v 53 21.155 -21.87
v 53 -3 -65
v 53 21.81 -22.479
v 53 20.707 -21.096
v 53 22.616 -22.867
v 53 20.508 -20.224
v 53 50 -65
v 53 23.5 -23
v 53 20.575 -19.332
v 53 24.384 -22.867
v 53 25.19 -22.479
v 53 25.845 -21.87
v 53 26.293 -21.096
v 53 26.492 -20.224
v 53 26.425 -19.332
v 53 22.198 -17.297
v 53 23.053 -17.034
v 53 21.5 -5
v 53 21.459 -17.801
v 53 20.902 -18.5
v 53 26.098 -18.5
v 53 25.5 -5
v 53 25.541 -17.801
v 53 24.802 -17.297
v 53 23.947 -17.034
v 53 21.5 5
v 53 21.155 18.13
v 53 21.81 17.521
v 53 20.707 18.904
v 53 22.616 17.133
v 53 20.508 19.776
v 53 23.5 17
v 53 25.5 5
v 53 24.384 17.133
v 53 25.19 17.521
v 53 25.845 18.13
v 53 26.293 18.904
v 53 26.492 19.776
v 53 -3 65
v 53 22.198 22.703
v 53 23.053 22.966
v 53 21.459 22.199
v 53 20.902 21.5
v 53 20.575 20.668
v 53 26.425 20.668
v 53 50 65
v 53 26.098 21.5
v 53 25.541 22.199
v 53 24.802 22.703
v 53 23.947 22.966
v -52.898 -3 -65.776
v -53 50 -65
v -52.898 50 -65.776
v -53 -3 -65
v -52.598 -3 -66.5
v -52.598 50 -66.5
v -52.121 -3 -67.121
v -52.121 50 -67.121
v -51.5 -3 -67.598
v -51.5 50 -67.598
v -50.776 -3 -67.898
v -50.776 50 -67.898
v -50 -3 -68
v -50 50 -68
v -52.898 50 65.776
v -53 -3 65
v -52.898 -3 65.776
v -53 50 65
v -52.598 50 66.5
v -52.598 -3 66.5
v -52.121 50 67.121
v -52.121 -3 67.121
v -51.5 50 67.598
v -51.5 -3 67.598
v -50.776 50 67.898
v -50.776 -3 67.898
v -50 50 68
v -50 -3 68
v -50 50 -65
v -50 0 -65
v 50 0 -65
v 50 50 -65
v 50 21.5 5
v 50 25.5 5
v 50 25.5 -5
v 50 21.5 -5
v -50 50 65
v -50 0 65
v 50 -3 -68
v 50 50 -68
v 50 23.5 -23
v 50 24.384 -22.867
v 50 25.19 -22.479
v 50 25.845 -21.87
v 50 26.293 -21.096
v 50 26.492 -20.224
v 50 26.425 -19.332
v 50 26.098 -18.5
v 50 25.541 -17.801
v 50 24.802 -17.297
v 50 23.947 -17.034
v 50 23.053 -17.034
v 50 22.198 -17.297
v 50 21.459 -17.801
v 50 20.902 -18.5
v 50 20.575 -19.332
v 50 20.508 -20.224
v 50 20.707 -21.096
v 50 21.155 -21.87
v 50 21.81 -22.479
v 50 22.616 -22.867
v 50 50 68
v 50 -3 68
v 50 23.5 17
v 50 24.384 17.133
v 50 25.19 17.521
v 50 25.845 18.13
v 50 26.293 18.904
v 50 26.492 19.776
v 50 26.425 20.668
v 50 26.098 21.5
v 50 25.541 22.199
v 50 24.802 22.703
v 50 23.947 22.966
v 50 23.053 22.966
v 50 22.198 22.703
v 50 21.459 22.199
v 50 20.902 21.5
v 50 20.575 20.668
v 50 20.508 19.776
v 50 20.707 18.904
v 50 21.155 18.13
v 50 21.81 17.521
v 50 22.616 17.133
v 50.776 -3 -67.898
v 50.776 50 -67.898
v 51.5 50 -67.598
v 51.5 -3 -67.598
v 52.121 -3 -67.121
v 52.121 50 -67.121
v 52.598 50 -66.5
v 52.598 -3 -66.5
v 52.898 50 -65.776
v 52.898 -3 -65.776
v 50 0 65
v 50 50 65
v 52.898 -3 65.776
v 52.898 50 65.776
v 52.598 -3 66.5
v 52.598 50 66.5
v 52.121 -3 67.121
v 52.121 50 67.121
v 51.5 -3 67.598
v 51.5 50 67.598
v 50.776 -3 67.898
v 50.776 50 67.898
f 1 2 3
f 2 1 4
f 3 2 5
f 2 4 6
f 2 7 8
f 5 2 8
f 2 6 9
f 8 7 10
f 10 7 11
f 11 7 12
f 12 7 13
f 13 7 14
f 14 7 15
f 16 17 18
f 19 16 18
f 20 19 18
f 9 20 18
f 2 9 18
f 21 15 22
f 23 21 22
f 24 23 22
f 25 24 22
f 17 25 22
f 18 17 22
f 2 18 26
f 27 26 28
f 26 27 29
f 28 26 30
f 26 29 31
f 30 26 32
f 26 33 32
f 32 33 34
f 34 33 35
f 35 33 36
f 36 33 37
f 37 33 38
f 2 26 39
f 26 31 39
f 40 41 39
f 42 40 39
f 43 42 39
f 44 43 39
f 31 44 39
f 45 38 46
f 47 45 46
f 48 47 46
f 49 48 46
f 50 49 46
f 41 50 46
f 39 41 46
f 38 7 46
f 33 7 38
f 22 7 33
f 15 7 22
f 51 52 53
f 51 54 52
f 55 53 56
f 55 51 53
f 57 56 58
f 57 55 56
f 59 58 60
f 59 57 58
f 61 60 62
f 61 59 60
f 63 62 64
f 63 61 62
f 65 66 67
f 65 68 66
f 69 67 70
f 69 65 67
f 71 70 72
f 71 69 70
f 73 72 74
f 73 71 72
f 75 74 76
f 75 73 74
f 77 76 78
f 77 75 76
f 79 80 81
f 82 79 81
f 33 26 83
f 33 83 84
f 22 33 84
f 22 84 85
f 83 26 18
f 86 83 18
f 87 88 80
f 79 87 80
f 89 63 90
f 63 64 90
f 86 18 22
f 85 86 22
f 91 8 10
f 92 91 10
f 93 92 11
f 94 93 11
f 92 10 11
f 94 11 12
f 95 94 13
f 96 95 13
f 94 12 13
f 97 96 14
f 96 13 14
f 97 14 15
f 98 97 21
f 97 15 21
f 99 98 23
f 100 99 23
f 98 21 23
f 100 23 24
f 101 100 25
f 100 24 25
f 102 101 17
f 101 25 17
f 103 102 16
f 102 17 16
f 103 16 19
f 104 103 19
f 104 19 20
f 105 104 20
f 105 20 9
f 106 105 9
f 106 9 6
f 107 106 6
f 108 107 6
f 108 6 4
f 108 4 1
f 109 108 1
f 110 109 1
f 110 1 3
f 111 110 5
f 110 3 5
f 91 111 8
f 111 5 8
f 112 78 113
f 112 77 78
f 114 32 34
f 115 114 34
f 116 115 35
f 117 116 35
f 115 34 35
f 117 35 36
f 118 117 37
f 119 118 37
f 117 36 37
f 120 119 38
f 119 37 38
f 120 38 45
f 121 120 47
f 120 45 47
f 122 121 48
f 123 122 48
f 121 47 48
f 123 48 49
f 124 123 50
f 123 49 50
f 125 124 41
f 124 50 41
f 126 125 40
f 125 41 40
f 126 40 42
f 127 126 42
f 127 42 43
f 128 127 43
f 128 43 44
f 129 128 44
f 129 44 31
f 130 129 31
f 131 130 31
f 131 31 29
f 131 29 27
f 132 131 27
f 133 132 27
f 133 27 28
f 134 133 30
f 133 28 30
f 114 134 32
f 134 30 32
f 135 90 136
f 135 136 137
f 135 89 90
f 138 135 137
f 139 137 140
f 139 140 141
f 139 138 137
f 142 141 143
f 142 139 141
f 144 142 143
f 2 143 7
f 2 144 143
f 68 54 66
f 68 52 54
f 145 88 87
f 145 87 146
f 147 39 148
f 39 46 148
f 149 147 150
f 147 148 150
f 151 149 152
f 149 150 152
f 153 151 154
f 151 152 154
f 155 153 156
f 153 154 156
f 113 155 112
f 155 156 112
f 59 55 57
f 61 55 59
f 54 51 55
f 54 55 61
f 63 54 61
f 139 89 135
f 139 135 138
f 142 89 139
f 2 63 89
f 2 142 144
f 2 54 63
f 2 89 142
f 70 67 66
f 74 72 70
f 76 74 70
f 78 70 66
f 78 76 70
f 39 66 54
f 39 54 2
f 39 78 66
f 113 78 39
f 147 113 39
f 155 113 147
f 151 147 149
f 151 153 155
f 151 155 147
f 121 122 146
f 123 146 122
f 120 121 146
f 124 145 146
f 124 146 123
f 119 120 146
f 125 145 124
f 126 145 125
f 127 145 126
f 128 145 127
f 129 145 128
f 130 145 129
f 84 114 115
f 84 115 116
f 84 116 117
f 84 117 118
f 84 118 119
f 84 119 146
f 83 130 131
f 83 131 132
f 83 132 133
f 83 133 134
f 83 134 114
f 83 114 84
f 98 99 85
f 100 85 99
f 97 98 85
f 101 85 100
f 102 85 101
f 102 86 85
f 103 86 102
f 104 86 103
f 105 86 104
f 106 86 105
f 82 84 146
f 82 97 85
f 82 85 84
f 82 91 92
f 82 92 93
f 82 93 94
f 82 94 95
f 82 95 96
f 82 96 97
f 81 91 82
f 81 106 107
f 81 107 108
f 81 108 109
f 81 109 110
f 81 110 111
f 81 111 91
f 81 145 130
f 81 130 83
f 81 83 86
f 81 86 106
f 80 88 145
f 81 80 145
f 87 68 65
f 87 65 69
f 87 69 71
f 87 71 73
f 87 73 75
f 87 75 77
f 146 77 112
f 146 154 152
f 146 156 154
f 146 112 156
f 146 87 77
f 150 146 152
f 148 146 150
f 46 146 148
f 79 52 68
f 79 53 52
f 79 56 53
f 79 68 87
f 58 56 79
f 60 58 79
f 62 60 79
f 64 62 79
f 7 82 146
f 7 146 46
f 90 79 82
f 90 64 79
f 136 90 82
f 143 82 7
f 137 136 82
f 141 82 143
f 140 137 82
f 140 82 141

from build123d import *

# Parameters (mm, degrees)
ESQUISSE1_W             = 106
ESQUISSE1_H             = 136
ESQUISSE1_W_2           = 100
ESQUISSE1_H_2           = 130
BOSS_EXTRU_1_DEPTH      = 50
ESQUISSE2_W             = 106
ESQUISSE2_H             = 136
BOSS_EXTRU_2_DEPTH      = 3
CONG_1_R                = 3
ESQUISSE3_R             = 3
ESQUISSE3_W             = 10
ESQUISSE3_H             = 4
ENL_V_MAT_EXTRU_1_DEPTH = 3


with BuildPart() as part:
    # Esquisse1 → Boss.-Extru.1 (new body)
    with BuildSketch(Plane(origin=(0, 0, 0), x_dir=(1, 0, 0), z_dir=(0, 1, 0))):
        Rectangle(ESQUISSE1_W, ESQUISSE1_H)
        Rectangle(ESQUISSE1_W_2, ESQUISSE1_H_2, mode=Mode.SUBTRACT)
    extrude(amount=BOSS_EXTRU_1_DEPTH)

    # Esquisse2 → Boss.-Extru.2 (add)
    with BuildSketch(Plane.XZ):
        Rectangle(ESQUISSE2_W, ESQUISSE2_H)
    extrude(amount=BOSS_EXTRU_2_DEPTH)

    # Congé1
    cong_1_edges = [part.edges().sort_by_distance(p)[0] for p in [
        (53, 23.5, 68),
        (-53, 23.5, 68),
        (-53, 23.5, -68),
        (53, 23.5, -68),
    ]]
    fillet(cong_1_edges, radius=CONG_1_R)

    # Esquisse3 → Enlèv. mat.-Extru.1 (cut)
    with BuildSketch(Plane(origin=(53, 0, 0), x_dir=(0, 0, -1), z_dir=(1, 0, 0))):
        with Locations((-20, 23.5)):
            Circle(ESQUISSE3_R)
        with Locations((20, 23.5)):
            Circle(ESQUISSE3_R)
        with Locations((0, 23.5)):
            Rectangle(ESQUISSE3_W, ESQUISSE3_H)
    extrude(amount=-ENL_V_MAT_EXTRU_1_DEPTH, mode=Mode.SUBTRACT)


solid = part.part
